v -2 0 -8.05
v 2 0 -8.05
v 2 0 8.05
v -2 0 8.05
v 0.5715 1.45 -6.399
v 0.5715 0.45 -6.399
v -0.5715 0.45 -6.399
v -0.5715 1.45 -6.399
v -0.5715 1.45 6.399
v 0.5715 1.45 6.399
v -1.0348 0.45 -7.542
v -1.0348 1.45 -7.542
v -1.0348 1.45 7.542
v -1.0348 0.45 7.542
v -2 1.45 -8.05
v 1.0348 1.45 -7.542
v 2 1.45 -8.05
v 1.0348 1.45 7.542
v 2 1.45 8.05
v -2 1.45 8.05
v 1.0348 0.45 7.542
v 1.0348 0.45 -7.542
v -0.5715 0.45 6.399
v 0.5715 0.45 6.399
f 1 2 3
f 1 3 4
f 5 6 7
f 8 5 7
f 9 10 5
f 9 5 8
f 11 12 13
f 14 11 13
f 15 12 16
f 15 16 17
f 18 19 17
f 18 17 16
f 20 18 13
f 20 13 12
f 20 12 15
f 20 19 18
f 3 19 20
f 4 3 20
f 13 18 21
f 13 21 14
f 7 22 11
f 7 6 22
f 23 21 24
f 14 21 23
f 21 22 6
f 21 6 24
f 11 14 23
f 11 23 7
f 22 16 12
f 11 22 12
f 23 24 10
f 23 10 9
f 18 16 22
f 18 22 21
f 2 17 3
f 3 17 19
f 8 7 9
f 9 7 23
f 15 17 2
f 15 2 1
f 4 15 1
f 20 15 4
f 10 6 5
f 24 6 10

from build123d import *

# Parameters (mm, degrees)
SKETCH1_W           = 4
SKETCH1_H           = 16.1
BOSS_EXTRUDE1_DEPTH = 1.45
SKETCH2_W           = 2.0696
SKETCH2_H           = 15.084
CUT_EXTRUDE1_DEPTH  = 1
SKETCH3_W           = 1.143
SKETCH3_H           = 12.798
BOSS_EXTRUDE2_DEPTH = 1


with BuildPart() as part:
    # Sketch1 → Boss-Extrude1 (new body)
    with BuildSketch(Plane(origin=(0, 1.45, 0), x_dir=(-1, 0, 0), z_dir=(0, 1, 0))):
        Rectangle(SKETCH1_W, SKETCH1_H)
    extrude(amount=-BOSS_EXTRUDE1_DEPTH)

    # Sketch2 → Cut-Extrude1 (cut)
    with BuildSketch(Plane(origin=(0, 1.45, 0), x_dir=(-1, 0, 0), z_dir=(0, 1, 0))):
        Rectangle(SKETCH2_W, SKETCH2_H)
    extrude(amount=-CUT_EXTRUDE1_DEPTH, mode=Mode.SUBTRACT)

    # Sketch3 → Boss-Extrude2 (add)
    with BuildSketch(Plane(origin=(0, 0.45, 0), x_dir=(-1, 0, 0), z_dir=(0, 1, 0))):
        Rectangle(SKETCH3_W, SKETCH3_H)
    extrude(amount=BOSS_EXTRUDE2_DEPTH)


solid = part.part
